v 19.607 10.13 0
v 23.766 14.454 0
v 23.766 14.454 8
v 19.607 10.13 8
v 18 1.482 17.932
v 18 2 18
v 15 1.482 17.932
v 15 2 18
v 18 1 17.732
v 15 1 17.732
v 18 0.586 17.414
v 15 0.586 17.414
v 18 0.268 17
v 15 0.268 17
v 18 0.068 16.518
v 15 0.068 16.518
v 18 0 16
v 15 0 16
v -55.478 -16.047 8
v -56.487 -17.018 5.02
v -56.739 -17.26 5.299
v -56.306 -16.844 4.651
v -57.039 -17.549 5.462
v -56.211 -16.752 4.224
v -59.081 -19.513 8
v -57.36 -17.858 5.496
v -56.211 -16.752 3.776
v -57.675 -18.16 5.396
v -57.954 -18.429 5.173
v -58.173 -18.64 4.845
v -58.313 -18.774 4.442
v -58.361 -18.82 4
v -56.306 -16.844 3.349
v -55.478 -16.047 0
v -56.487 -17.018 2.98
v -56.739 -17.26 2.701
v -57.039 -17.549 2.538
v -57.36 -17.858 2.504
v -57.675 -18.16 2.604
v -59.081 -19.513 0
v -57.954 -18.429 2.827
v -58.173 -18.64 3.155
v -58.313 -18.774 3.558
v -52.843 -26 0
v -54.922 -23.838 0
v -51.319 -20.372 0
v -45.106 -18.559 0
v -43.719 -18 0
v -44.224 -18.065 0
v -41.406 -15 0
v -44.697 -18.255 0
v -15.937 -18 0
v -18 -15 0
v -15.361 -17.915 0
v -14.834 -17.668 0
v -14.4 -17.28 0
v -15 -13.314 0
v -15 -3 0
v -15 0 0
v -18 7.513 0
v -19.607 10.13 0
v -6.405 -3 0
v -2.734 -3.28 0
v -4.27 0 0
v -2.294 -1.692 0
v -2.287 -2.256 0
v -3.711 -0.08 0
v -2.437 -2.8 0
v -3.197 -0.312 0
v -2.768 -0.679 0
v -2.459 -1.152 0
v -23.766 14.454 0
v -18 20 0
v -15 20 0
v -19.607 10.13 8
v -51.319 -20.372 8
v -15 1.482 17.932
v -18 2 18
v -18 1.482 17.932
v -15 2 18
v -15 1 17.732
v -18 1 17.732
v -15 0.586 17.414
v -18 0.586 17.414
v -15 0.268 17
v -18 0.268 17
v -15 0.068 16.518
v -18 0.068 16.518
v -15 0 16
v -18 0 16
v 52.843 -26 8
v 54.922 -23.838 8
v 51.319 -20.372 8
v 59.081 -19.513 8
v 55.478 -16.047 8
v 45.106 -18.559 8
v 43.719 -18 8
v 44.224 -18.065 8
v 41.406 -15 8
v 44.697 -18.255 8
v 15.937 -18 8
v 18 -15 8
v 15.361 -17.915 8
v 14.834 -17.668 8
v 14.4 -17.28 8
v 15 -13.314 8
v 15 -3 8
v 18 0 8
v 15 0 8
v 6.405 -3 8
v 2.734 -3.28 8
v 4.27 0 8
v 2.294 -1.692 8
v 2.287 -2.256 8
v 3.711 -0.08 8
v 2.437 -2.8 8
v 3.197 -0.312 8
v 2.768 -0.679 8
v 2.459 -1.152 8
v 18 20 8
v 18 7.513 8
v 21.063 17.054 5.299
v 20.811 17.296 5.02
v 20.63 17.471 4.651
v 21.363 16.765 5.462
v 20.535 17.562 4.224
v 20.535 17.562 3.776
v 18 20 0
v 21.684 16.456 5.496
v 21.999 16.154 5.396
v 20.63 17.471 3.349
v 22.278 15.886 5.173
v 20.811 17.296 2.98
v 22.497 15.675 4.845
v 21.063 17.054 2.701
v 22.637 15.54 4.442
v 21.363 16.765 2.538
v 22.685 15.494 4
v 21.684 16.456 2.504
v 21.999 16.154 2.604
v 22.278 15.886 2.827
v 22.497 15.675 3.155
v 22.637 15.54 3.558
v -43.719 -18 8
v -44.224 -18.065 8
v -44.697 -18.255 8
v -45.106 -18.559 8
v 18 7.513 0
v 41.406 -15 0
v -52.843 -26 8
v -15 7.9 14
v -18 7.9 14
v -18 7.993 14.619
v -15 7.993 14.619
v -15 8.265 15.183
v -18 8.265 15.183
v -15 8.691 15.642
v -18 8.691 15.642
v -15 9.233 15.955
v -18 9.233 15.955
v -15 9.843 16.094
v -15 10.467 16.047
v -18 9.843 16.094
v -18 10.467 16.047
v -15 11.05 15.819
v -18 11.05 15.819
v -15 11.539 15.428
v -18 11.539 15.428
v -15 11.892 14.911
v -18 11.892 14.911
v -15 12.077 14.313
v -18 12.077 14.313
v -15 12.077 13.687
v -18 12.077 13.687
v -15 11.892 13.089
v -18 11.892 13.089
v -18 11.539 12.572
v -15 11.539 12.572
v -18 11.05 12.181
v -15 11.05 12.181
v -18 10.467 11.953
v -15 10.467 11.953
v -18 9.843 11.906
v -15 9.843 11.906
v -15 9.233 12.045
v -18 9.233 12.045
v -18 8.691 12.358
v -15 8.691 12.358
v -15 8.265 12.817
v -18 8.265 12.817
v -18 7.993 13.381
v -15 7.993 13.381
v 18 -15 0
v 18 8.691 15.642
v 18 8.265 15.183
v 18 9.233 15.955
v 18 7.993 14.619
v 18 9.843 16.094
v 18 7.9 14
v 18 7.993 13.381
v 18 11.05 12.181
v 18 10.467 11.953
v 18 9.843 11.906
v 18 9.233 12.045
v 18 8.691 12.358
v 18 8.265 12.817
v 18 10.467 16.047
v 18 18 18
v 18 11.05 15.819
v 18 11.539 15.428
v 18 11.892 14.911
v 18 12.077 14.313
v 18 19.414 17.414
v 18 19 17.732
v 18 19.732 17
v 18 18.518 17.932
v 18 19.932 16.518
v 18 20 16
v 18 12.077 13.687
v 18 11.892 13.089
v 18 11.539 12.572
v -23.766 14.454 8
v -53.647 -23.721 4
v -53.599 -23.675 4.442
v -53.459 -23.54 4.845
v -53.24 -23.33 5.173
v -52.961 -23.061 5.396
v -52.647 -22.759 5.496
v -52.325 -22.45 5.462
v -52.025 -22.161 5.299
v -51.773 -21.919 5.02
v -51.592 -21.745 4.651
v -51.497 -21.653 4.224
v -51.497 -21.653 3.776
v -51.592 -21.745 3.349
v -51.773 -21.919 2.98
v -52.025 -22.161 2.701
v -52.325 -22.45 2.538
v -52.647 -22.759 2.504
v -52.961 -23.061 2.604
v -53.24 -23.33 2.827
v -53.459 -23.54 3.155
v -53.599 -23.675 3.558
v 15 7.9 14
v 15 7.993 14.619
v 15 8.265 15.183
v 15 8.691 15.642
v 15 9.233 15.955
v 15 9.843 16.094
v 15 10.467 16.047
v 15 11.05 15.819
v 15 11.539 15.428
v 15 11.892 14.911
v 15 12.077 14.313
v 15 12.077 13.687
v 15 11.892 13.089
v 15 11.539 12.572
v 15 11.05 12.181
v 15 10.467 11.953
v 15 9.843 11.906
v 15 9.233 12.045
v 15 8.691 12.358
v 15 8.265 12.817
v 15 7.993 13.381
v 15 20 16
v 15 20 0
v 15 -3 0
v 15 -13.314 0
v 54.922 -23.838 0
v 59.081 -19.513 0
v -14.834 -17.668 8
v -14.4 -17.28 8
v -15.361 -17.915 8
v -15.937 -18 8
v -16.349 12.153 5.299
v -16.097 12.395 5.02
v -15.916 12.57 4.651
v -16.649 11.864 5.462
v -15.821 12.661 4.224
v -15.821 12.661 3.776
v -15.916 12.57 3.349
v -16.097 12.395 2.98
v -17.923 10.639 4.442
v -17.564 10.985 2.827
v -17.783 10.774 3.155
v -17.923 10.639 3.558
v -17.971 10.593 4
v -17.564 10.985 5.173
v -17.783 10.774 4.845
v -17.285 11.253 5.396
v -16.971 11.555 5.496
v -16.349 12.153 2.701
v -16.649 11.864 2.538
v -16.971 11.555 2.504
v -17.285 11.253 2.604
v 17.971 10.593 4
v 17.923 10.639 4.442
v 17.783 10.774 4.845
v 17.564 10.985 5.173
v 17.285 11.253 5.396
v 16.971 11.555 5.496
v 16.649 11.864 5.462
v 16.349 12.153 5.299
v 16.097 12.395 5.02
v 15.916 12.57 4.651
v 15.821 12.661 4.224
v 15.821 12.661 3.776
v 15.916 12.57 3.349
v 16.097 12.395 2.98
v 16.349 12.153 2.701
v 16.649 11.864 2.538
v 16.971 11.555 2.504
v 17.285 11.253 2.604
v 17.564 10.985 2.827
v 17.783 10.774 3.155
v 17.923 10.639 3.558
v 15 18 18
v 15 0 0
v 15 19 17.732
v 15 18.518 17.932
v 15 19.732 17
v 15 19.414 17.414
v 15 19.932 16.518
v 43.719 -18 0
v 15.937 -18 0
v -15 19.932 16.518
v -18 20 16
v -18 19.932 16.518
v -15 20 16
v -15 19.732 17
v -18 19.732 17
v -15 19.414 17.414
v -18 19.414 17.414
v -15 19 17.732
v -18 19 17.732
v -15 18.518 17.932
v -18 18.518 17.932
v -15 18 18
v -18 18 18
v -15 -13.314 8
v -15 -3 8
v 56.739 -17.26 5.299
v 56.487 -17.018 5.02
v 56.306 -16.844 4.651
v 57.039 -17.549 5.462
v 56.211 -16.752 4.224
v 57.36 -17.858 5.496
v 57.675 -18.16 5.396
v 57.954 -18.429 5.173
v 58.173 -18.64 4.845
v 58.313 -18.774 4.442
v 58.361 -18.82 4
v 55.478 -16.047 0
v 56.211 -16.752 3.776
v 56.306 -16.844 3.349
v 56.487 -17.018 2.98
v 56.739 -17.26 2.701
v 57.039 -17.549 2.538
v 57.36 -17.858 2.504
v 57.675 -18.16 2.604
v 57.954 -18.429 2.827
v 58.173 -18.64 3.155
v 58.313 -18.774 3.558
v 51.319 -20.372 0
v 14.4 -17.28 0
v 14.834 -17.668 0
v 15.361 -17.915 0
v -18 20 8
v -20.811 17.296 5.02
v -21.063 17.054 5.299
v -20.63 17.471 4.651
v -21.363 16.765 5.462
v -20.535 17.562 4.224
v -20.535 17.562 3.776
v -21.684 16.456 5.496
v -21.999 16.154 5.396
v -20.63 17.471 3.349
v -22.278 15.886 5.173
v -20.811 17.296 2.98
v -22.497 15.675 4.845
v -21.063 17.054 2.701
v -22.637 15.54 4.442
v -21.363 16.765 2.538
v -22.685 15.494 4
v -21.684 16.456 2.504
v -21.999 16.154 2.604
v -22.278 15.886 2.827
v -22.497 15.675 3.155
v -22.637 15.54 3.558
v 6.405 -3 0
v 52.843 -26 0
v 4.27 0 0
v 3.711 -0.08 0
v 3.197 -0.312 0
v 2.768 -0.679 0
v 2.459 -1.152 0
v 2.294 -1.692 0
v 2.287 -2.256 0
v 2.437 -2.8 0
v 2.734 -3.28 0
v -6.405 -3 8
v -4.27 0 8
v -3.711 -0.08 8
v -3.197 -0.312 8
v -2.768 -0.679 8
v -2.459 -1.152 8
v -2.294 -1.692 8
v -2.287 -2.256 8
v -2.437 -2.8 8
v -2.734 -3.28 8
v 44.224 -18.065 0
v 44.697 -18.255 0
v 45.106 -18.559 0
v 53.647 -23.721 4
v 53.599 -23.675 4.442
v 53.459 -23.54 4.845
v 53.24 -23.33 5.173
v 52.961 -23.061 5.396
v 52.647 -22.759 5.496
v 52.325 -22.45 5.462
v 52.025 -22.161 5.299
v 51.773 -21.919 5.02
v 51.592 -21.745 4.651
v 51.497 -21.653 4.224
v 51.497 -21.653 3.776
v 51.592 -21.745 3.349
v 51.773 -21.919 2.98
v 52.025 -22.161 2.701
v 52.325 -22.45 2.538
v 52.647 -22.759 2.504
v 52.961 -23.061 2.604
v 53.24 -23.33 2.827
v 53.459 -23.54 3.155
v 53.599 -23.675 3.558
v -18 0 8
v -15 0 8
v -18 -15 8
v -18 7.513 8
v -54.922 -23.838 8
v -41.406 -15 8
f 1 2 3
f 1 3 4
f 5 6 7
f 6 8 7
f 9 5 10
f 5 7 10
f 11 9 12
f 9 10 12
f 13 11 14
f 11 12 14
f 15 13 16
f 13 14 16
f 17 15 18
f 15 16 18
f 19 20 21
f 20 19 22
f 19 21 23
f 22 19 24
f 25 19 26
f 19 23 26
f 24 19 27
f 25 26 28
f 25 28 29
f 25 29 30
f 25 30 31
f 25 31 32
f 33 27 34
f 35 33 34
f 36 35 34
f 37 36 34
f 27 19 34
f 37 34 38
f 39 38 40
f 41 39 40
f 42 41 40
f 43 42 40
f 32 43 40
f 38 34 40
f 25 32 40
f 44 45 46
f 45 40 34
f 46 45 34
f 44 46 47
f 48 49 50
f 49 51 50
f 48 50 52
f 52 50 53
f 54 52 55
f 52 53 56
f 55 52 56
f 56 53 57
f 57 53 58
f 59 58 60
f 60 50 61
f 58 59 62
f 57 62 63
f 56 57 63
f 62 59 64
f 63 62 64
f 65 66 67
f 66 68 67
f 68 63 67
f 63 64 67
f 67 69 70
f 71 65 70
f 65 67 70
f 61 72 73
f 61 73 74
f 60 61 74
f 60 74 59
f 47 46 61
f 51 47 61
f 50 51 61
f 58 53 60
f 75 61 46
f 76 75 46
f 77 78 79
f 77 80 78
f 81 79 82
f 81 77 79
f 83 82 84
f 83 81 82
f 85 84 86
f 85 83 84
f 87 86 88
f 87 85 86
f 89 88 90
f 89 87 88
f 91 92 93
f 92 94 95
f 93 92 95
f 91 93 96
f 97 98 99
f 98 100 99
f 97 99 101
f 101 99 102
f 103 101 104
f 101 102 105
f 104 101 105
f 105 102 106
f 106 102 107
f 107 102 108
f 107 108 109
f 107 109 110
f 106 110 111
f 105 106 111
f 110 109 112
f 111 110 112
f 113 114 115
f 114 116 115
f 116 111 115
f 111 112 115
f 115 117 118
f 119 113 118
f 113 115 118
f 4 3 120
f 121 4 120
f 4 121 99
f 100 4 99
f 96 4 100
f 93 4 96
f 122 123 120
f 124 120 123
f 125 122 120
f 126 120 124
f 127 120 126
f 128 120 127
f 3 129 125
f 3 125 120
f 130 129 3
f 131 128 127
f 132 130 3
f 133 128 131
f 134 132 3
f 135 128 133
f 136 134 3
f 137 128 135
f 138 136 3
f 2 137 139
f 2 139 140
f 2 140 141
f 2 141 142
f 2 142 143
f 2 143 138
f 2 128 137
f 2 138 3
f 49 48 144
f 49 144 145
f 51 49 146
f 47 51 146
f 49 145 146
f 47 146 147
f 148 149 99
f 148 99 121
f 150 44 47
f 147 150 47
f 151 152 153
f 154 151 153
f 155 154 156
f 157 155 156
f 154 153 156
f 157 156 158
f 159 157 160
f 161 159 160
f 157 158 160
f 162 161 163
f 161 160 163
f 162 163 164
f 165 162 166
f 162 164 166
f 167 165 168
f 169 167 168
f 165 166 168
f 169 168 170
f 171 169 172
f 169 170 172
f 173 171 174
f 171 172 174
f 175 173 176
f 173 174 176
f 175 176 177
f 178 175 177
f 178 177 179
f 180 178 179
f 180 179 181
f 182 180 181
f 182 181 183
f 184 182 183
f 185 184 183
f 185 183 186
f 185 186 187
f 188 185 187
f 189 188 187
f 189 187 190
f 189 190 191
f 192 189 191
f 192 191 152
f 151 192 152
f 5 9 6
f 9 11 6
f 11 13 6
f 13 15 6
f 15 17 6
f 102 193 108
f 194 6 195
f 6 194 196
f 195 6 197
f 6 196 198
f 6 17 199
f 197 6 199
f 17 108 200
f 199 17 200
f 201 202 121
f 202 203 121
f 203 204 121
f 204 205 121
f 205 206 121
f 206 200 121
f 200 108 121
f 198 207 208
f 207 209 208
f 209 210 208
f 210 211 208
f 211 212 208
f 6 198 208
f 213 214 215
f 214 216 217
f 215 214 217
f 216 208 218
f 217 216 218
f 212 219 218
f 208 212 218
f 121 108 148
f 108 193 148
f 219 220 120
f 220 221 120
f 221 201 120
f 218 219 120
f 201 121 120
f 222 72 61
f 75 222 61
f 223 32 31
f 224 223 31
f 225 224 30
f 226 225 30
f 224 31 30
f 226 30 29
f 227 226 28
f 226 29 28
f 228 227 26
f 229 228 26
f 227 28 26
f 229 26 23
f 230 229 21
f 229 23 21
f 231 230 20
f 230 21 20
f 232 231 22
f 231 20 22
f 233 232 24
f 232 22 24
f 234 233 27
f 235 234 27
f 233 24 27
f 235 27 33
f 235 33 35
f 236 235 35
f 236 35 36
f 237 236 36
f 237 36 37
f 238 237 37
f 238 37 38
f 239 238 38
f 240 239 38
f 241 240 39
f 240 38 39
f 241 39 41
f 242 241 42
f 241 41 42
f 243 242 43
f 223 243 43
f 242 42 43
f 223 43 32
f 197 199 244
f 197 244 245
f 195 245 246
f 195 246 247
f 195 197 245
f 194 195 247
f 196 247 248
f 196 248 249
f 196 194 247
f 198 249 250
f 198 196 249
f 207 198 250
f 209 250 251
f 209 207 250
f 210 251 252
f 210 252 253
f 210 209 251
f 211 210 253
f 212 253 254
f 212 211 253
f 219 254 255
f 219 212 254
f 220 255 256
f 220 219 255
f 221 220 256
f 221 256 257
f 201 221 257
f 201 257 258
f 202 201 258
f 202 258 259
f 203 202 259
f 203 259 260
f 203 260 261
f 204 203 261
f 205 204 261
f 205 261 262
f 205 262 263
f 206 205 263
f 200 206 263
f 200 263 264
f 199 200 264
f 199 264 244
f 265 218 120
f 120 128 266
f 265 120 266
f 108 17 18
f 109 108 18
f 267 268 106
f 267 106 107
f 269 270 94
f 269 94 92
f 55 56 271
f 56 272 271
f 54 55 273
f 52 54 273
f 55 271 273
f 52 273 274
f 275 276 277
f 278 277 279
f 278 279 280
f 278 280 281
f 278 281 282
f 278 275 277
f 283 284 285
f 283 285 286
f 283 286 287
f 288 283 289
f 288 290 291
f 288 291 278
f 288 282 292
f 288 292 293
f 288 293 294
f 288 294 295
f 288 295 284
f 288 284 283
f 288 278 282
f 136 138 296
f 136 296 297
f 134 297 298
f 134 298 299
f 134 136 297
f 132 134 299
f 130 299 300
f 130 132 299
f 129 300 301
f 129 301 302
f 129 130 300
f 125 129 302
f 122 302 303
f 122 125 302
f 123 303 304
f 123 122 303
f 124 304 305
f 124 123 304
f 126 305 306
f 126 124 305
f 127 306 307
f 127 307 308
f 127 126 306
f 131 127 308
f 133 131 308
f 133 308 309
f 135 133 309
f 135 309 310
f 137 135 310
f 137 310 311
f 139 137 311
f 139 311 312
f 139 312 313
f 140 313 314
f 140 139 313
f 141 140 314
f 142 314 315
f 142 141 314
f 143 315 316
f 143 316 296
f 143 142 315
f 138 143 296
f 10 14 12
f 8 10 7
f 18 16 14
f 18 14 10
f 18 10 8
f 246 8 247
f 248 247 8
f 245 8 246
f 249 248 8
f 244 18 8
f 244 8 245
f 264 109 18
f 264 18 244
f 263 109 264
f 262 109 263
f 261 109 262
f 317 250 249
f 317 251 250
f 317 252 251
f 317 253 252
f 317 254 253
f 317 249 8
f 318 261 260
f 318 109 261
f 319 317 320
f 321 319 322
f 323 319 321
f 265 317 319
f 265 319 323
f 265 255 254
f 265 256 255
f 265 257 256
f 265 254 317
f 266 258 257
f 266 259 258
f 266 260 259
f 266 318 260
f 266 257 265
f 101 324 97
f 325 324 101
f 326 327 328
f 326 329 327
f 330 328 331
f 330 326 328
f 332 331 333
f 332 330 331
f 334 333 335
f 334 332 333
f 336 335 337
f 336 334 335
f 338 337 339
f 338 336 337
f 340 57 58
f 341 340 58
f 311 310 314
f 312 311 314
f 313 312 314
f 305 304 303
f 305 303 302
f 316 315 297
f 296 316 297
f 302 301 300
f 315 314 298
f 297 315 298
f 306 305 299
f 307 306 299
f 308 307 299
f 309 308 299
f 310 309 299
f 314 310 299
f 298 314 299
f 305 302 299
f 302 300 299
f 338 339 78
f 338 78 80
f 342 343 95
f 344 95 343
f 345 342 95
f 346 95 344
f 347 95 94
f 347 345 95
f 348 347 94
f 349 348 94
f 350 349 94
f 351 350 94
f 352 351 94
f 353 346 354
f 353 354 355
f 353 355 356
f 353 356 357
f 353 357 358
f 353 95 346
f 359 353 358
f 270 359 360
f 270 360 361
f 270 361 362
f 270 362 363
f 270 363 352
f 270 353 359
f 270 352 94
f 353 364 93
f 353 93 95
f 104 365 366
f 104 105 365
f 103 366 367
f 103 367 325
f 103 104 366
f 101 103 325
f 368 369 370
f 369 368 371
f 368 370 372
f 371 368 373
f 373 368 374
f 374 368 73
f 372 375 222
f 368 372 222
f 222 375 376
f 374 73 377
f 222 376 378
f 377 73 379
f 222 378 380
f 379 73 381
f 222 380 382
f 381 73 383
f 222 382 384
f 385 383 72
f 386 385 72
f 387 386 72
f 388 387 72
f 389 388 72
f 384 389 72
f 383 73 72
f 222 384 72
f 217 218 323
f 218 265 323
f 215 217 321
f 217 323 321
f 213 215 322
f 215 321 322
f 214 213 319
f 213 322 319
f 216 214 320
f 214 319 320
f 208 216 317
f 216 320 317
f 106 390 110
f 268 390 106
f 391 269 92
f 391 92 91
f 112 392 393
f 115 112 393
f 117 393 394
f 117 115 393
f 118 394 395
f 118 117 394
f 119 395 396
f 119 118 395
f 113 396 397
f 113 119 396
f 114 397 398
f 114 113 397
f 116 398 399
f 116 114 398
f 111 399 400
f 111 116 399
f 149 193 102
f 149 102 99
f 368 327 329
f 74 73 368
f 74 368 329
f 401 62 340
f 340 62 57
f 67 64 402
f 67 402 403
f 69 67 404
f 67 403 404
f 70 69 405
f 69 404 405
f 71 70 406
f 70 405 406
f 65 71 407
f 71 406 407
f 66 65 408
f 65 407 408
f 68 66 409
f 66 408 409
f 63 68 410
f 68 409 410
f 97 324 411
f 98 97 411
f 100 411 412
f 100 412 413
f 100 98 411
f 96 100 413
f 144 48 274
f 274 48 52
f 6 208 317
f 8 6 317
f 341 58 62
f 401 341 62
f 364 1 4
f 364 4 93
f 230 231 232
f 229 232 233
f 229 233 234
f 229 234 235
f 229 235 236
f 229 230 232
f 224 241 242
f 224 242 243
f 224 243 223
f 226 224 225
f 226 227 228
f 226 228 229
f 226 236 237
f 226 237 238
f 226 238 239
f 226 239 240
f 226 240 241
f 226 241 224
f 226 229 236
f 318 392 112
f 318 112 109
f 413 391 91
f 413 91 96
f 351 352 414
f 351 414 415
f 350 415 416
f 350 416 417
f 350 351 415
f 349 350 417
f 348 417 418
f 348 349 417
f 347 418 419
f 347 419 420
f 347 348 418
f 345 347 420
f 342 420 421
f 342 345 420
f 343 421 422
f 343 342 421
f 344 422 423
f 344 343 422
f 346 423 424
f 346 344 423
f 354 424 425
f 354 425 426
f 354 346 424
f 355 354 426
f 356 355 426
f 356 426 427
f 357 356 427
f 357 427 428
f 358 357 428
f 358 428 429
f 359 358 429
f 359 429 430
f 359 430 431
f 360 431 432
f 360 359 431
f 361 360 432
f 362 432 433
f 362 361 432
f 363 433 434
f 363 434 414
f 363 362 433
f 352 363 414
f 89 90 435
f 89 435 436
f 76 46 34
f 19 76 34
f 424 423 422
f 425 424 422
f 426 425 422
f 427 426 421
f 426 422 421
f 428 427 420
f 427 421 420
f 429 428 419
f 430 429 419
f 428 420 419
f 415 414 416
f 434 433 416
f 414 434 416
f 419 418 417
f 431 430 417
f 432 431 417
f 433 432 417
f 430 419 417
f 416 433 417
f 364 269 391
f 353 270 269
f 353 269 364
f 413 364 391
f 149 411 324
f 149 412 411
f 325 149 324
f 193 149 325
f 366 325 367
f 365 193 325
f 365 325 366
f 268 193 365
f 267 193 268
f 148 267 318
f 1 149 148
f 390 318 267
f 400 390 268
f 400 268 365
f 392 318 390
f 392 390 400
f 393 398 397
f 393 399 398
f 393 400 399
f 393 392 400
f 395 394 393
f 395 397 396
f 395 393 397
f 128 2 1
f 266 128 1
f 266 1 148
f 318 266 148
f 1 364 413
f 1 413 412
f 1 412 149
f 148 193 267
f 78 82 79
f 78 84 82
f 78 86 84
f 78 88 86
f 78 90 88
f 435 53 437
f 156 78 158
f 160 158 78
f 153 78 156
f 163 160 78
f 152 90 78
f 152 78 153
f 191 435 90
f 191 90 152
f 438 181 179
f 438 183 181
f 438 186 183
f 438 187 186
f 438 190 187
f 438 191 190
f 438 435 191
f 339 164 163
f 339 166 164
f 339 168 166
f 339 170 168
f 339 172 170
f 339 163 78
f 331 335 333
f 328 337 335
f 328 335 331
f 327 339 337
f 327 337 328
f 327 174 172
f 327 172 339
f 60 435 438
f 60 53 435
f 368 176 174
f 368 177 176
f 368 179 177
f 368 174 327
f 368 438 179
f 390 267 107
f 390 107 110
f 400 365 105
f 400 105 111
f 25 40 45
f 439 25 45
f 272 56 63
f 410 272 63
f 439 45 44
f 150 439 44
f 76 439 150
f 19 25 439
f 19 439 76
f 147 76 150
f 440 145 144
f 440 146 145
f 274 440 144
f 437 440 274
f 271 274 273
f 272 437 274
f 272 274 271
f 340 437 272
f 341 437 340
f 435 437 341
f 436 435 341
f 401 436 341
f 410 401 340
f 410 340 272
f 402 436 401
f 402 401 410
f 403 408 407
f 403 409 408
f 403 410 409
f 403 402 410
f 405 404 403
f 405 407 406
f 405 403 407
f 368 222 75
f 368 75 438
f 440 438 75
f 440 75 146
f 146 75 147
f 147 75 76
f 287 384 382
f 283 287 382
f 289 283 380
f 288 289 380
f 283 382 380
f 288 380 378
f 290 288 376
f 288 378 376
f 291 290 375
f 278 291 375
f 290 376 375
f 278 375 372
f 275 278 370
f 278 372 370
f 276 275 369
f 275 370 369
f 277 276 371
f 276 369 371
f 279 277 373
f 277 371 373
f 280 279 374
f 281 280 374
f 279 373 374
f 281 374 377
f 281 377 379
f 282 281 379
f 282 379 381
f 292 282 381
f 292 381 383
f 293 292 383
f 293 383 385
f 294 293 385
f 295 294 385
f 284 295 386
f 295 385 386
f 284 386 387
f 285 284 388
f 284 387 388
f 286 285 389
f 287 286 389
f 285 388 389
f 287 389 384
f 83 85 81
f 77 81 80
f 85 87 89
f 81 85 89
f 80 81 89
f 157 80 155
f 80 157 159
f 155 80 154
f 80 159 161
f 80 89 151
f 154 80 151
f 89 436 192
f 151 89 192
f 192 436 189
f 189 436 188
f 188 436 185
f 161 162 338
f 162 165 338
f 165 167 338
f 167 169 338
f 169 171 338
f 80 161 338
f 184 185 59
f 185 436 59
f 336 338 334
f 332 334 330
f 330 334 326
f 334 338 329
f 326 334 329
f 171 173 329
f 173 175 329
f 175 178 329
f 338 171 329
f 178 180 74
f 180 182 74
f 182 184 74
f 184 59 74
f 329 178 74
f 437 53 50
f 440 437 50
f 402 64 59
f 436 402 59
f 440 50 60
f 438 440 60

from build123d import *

# Parameters (mm, degrees)
F1_DEPTH = 8
F2_R     = 1.5
F3_DEPTH = 6.8
F4_W     = 3
F4_H     = 20
F5_DEPTH = 10
F6_R     = 2
F7_R     = 2.1
F8_DEPTH = 15.7309167747


with BuildPart() as f1:
    # F0 (on Top) → F1 (new body)
    with BuildSketch(Plane.XY):
        Polygon((-15, 20), (-18, 20), (-18, 11.6750785959), (-18, 7.5126178938), (-18, -15), (-18, -18), (-15, -18), (-15, -13.3138501945), (-15, -3), (-15, 0), align=None)
        Polygon((-18, 11.6750785959), (-18, 20), (-23.7658202006, 14.4542523124), (-19.6065094348, 10.129887162), align=None)
        Polygon((-18, 7.5126178938), (-18, 11.6750785959), (-19.6065094348, 10.129887162), (-51.3185205379, -20.37172512), (-54.9221581632, -23.8378174248), (-52.8425027804, -26), (-44.5250379041, -18), (-41.4059885755, -15), align=None)
        Polygon((0, 0), (-15, 0), (-15, -3), (-6.405124838, -3), (-15, -13.3138501945), (-15, -18), align=None)
        Polygon((-18, -18), (-18, -15), (-41.4059885755, -15), (-44.5250379041, -18), align=None)
        Polygon((-54.9221581632, -23.8378174248), (-51.3185205379, -20.37172512), (-55.4778313036, -16.0473599696), (-59.081468929, -19.5134522744), align=None)
    extrude(amount=F1_DEPTH)

    # F2 (on face) → F3 (cut)
    with BuildSketch(Plane(origin=(-18.6423655368, 19.3821525704, 0), x_dir=(-0.7207275251, -0.693218461, 0), z_dir=(-0.693218461, 0.7207275251, 0))):
        with Locations((53.6087262322, 4)):
            Circle(F2_R)
        with Locations((4.1087262322, 4)):
            Circle(F2_R)
    extrude(amount=-F3_DEPTH, mode=Mode.SUBTRACT)

    # F4 (on face) → F5 (join)
    with BuildSketch(Plane.XY.offset(8)):
        with Locations((-16.5, 10)):
            Rectangle(F4_W, F4_H)
    extrude(amount=F5_DEPTH)

    # F6
    f6_edges = [f1.edges().sort_by_distance(p)[0] for p in [
        (0, 0, 4),
        (-15, -18, 4),
        (-44.525038, -18, 4),
        (-16.5, 0, 18),
        (-16.5, 20, 18),
    ]]
    fillet(f6_edges, radius=F6_R)

    # F7 (on face) → F8 (cut, through all)
    with BuildSketch(Plane(origin=(-18, 0, 0), x_dir=(0, -1, 0), z_dir=(-1, 0, 0))):
        with Locations((-10, 14)):
            Circle(F7_R)
    extrude(amount=-F8_DEPTH, mode=Mode.SUBTRACT)


with BuildPart() as f9_1:
    # F9: instance of F1
    add(f1.part.mirror(Plane.YZ))


solid = Compound([f1.part, f9_1.part])
